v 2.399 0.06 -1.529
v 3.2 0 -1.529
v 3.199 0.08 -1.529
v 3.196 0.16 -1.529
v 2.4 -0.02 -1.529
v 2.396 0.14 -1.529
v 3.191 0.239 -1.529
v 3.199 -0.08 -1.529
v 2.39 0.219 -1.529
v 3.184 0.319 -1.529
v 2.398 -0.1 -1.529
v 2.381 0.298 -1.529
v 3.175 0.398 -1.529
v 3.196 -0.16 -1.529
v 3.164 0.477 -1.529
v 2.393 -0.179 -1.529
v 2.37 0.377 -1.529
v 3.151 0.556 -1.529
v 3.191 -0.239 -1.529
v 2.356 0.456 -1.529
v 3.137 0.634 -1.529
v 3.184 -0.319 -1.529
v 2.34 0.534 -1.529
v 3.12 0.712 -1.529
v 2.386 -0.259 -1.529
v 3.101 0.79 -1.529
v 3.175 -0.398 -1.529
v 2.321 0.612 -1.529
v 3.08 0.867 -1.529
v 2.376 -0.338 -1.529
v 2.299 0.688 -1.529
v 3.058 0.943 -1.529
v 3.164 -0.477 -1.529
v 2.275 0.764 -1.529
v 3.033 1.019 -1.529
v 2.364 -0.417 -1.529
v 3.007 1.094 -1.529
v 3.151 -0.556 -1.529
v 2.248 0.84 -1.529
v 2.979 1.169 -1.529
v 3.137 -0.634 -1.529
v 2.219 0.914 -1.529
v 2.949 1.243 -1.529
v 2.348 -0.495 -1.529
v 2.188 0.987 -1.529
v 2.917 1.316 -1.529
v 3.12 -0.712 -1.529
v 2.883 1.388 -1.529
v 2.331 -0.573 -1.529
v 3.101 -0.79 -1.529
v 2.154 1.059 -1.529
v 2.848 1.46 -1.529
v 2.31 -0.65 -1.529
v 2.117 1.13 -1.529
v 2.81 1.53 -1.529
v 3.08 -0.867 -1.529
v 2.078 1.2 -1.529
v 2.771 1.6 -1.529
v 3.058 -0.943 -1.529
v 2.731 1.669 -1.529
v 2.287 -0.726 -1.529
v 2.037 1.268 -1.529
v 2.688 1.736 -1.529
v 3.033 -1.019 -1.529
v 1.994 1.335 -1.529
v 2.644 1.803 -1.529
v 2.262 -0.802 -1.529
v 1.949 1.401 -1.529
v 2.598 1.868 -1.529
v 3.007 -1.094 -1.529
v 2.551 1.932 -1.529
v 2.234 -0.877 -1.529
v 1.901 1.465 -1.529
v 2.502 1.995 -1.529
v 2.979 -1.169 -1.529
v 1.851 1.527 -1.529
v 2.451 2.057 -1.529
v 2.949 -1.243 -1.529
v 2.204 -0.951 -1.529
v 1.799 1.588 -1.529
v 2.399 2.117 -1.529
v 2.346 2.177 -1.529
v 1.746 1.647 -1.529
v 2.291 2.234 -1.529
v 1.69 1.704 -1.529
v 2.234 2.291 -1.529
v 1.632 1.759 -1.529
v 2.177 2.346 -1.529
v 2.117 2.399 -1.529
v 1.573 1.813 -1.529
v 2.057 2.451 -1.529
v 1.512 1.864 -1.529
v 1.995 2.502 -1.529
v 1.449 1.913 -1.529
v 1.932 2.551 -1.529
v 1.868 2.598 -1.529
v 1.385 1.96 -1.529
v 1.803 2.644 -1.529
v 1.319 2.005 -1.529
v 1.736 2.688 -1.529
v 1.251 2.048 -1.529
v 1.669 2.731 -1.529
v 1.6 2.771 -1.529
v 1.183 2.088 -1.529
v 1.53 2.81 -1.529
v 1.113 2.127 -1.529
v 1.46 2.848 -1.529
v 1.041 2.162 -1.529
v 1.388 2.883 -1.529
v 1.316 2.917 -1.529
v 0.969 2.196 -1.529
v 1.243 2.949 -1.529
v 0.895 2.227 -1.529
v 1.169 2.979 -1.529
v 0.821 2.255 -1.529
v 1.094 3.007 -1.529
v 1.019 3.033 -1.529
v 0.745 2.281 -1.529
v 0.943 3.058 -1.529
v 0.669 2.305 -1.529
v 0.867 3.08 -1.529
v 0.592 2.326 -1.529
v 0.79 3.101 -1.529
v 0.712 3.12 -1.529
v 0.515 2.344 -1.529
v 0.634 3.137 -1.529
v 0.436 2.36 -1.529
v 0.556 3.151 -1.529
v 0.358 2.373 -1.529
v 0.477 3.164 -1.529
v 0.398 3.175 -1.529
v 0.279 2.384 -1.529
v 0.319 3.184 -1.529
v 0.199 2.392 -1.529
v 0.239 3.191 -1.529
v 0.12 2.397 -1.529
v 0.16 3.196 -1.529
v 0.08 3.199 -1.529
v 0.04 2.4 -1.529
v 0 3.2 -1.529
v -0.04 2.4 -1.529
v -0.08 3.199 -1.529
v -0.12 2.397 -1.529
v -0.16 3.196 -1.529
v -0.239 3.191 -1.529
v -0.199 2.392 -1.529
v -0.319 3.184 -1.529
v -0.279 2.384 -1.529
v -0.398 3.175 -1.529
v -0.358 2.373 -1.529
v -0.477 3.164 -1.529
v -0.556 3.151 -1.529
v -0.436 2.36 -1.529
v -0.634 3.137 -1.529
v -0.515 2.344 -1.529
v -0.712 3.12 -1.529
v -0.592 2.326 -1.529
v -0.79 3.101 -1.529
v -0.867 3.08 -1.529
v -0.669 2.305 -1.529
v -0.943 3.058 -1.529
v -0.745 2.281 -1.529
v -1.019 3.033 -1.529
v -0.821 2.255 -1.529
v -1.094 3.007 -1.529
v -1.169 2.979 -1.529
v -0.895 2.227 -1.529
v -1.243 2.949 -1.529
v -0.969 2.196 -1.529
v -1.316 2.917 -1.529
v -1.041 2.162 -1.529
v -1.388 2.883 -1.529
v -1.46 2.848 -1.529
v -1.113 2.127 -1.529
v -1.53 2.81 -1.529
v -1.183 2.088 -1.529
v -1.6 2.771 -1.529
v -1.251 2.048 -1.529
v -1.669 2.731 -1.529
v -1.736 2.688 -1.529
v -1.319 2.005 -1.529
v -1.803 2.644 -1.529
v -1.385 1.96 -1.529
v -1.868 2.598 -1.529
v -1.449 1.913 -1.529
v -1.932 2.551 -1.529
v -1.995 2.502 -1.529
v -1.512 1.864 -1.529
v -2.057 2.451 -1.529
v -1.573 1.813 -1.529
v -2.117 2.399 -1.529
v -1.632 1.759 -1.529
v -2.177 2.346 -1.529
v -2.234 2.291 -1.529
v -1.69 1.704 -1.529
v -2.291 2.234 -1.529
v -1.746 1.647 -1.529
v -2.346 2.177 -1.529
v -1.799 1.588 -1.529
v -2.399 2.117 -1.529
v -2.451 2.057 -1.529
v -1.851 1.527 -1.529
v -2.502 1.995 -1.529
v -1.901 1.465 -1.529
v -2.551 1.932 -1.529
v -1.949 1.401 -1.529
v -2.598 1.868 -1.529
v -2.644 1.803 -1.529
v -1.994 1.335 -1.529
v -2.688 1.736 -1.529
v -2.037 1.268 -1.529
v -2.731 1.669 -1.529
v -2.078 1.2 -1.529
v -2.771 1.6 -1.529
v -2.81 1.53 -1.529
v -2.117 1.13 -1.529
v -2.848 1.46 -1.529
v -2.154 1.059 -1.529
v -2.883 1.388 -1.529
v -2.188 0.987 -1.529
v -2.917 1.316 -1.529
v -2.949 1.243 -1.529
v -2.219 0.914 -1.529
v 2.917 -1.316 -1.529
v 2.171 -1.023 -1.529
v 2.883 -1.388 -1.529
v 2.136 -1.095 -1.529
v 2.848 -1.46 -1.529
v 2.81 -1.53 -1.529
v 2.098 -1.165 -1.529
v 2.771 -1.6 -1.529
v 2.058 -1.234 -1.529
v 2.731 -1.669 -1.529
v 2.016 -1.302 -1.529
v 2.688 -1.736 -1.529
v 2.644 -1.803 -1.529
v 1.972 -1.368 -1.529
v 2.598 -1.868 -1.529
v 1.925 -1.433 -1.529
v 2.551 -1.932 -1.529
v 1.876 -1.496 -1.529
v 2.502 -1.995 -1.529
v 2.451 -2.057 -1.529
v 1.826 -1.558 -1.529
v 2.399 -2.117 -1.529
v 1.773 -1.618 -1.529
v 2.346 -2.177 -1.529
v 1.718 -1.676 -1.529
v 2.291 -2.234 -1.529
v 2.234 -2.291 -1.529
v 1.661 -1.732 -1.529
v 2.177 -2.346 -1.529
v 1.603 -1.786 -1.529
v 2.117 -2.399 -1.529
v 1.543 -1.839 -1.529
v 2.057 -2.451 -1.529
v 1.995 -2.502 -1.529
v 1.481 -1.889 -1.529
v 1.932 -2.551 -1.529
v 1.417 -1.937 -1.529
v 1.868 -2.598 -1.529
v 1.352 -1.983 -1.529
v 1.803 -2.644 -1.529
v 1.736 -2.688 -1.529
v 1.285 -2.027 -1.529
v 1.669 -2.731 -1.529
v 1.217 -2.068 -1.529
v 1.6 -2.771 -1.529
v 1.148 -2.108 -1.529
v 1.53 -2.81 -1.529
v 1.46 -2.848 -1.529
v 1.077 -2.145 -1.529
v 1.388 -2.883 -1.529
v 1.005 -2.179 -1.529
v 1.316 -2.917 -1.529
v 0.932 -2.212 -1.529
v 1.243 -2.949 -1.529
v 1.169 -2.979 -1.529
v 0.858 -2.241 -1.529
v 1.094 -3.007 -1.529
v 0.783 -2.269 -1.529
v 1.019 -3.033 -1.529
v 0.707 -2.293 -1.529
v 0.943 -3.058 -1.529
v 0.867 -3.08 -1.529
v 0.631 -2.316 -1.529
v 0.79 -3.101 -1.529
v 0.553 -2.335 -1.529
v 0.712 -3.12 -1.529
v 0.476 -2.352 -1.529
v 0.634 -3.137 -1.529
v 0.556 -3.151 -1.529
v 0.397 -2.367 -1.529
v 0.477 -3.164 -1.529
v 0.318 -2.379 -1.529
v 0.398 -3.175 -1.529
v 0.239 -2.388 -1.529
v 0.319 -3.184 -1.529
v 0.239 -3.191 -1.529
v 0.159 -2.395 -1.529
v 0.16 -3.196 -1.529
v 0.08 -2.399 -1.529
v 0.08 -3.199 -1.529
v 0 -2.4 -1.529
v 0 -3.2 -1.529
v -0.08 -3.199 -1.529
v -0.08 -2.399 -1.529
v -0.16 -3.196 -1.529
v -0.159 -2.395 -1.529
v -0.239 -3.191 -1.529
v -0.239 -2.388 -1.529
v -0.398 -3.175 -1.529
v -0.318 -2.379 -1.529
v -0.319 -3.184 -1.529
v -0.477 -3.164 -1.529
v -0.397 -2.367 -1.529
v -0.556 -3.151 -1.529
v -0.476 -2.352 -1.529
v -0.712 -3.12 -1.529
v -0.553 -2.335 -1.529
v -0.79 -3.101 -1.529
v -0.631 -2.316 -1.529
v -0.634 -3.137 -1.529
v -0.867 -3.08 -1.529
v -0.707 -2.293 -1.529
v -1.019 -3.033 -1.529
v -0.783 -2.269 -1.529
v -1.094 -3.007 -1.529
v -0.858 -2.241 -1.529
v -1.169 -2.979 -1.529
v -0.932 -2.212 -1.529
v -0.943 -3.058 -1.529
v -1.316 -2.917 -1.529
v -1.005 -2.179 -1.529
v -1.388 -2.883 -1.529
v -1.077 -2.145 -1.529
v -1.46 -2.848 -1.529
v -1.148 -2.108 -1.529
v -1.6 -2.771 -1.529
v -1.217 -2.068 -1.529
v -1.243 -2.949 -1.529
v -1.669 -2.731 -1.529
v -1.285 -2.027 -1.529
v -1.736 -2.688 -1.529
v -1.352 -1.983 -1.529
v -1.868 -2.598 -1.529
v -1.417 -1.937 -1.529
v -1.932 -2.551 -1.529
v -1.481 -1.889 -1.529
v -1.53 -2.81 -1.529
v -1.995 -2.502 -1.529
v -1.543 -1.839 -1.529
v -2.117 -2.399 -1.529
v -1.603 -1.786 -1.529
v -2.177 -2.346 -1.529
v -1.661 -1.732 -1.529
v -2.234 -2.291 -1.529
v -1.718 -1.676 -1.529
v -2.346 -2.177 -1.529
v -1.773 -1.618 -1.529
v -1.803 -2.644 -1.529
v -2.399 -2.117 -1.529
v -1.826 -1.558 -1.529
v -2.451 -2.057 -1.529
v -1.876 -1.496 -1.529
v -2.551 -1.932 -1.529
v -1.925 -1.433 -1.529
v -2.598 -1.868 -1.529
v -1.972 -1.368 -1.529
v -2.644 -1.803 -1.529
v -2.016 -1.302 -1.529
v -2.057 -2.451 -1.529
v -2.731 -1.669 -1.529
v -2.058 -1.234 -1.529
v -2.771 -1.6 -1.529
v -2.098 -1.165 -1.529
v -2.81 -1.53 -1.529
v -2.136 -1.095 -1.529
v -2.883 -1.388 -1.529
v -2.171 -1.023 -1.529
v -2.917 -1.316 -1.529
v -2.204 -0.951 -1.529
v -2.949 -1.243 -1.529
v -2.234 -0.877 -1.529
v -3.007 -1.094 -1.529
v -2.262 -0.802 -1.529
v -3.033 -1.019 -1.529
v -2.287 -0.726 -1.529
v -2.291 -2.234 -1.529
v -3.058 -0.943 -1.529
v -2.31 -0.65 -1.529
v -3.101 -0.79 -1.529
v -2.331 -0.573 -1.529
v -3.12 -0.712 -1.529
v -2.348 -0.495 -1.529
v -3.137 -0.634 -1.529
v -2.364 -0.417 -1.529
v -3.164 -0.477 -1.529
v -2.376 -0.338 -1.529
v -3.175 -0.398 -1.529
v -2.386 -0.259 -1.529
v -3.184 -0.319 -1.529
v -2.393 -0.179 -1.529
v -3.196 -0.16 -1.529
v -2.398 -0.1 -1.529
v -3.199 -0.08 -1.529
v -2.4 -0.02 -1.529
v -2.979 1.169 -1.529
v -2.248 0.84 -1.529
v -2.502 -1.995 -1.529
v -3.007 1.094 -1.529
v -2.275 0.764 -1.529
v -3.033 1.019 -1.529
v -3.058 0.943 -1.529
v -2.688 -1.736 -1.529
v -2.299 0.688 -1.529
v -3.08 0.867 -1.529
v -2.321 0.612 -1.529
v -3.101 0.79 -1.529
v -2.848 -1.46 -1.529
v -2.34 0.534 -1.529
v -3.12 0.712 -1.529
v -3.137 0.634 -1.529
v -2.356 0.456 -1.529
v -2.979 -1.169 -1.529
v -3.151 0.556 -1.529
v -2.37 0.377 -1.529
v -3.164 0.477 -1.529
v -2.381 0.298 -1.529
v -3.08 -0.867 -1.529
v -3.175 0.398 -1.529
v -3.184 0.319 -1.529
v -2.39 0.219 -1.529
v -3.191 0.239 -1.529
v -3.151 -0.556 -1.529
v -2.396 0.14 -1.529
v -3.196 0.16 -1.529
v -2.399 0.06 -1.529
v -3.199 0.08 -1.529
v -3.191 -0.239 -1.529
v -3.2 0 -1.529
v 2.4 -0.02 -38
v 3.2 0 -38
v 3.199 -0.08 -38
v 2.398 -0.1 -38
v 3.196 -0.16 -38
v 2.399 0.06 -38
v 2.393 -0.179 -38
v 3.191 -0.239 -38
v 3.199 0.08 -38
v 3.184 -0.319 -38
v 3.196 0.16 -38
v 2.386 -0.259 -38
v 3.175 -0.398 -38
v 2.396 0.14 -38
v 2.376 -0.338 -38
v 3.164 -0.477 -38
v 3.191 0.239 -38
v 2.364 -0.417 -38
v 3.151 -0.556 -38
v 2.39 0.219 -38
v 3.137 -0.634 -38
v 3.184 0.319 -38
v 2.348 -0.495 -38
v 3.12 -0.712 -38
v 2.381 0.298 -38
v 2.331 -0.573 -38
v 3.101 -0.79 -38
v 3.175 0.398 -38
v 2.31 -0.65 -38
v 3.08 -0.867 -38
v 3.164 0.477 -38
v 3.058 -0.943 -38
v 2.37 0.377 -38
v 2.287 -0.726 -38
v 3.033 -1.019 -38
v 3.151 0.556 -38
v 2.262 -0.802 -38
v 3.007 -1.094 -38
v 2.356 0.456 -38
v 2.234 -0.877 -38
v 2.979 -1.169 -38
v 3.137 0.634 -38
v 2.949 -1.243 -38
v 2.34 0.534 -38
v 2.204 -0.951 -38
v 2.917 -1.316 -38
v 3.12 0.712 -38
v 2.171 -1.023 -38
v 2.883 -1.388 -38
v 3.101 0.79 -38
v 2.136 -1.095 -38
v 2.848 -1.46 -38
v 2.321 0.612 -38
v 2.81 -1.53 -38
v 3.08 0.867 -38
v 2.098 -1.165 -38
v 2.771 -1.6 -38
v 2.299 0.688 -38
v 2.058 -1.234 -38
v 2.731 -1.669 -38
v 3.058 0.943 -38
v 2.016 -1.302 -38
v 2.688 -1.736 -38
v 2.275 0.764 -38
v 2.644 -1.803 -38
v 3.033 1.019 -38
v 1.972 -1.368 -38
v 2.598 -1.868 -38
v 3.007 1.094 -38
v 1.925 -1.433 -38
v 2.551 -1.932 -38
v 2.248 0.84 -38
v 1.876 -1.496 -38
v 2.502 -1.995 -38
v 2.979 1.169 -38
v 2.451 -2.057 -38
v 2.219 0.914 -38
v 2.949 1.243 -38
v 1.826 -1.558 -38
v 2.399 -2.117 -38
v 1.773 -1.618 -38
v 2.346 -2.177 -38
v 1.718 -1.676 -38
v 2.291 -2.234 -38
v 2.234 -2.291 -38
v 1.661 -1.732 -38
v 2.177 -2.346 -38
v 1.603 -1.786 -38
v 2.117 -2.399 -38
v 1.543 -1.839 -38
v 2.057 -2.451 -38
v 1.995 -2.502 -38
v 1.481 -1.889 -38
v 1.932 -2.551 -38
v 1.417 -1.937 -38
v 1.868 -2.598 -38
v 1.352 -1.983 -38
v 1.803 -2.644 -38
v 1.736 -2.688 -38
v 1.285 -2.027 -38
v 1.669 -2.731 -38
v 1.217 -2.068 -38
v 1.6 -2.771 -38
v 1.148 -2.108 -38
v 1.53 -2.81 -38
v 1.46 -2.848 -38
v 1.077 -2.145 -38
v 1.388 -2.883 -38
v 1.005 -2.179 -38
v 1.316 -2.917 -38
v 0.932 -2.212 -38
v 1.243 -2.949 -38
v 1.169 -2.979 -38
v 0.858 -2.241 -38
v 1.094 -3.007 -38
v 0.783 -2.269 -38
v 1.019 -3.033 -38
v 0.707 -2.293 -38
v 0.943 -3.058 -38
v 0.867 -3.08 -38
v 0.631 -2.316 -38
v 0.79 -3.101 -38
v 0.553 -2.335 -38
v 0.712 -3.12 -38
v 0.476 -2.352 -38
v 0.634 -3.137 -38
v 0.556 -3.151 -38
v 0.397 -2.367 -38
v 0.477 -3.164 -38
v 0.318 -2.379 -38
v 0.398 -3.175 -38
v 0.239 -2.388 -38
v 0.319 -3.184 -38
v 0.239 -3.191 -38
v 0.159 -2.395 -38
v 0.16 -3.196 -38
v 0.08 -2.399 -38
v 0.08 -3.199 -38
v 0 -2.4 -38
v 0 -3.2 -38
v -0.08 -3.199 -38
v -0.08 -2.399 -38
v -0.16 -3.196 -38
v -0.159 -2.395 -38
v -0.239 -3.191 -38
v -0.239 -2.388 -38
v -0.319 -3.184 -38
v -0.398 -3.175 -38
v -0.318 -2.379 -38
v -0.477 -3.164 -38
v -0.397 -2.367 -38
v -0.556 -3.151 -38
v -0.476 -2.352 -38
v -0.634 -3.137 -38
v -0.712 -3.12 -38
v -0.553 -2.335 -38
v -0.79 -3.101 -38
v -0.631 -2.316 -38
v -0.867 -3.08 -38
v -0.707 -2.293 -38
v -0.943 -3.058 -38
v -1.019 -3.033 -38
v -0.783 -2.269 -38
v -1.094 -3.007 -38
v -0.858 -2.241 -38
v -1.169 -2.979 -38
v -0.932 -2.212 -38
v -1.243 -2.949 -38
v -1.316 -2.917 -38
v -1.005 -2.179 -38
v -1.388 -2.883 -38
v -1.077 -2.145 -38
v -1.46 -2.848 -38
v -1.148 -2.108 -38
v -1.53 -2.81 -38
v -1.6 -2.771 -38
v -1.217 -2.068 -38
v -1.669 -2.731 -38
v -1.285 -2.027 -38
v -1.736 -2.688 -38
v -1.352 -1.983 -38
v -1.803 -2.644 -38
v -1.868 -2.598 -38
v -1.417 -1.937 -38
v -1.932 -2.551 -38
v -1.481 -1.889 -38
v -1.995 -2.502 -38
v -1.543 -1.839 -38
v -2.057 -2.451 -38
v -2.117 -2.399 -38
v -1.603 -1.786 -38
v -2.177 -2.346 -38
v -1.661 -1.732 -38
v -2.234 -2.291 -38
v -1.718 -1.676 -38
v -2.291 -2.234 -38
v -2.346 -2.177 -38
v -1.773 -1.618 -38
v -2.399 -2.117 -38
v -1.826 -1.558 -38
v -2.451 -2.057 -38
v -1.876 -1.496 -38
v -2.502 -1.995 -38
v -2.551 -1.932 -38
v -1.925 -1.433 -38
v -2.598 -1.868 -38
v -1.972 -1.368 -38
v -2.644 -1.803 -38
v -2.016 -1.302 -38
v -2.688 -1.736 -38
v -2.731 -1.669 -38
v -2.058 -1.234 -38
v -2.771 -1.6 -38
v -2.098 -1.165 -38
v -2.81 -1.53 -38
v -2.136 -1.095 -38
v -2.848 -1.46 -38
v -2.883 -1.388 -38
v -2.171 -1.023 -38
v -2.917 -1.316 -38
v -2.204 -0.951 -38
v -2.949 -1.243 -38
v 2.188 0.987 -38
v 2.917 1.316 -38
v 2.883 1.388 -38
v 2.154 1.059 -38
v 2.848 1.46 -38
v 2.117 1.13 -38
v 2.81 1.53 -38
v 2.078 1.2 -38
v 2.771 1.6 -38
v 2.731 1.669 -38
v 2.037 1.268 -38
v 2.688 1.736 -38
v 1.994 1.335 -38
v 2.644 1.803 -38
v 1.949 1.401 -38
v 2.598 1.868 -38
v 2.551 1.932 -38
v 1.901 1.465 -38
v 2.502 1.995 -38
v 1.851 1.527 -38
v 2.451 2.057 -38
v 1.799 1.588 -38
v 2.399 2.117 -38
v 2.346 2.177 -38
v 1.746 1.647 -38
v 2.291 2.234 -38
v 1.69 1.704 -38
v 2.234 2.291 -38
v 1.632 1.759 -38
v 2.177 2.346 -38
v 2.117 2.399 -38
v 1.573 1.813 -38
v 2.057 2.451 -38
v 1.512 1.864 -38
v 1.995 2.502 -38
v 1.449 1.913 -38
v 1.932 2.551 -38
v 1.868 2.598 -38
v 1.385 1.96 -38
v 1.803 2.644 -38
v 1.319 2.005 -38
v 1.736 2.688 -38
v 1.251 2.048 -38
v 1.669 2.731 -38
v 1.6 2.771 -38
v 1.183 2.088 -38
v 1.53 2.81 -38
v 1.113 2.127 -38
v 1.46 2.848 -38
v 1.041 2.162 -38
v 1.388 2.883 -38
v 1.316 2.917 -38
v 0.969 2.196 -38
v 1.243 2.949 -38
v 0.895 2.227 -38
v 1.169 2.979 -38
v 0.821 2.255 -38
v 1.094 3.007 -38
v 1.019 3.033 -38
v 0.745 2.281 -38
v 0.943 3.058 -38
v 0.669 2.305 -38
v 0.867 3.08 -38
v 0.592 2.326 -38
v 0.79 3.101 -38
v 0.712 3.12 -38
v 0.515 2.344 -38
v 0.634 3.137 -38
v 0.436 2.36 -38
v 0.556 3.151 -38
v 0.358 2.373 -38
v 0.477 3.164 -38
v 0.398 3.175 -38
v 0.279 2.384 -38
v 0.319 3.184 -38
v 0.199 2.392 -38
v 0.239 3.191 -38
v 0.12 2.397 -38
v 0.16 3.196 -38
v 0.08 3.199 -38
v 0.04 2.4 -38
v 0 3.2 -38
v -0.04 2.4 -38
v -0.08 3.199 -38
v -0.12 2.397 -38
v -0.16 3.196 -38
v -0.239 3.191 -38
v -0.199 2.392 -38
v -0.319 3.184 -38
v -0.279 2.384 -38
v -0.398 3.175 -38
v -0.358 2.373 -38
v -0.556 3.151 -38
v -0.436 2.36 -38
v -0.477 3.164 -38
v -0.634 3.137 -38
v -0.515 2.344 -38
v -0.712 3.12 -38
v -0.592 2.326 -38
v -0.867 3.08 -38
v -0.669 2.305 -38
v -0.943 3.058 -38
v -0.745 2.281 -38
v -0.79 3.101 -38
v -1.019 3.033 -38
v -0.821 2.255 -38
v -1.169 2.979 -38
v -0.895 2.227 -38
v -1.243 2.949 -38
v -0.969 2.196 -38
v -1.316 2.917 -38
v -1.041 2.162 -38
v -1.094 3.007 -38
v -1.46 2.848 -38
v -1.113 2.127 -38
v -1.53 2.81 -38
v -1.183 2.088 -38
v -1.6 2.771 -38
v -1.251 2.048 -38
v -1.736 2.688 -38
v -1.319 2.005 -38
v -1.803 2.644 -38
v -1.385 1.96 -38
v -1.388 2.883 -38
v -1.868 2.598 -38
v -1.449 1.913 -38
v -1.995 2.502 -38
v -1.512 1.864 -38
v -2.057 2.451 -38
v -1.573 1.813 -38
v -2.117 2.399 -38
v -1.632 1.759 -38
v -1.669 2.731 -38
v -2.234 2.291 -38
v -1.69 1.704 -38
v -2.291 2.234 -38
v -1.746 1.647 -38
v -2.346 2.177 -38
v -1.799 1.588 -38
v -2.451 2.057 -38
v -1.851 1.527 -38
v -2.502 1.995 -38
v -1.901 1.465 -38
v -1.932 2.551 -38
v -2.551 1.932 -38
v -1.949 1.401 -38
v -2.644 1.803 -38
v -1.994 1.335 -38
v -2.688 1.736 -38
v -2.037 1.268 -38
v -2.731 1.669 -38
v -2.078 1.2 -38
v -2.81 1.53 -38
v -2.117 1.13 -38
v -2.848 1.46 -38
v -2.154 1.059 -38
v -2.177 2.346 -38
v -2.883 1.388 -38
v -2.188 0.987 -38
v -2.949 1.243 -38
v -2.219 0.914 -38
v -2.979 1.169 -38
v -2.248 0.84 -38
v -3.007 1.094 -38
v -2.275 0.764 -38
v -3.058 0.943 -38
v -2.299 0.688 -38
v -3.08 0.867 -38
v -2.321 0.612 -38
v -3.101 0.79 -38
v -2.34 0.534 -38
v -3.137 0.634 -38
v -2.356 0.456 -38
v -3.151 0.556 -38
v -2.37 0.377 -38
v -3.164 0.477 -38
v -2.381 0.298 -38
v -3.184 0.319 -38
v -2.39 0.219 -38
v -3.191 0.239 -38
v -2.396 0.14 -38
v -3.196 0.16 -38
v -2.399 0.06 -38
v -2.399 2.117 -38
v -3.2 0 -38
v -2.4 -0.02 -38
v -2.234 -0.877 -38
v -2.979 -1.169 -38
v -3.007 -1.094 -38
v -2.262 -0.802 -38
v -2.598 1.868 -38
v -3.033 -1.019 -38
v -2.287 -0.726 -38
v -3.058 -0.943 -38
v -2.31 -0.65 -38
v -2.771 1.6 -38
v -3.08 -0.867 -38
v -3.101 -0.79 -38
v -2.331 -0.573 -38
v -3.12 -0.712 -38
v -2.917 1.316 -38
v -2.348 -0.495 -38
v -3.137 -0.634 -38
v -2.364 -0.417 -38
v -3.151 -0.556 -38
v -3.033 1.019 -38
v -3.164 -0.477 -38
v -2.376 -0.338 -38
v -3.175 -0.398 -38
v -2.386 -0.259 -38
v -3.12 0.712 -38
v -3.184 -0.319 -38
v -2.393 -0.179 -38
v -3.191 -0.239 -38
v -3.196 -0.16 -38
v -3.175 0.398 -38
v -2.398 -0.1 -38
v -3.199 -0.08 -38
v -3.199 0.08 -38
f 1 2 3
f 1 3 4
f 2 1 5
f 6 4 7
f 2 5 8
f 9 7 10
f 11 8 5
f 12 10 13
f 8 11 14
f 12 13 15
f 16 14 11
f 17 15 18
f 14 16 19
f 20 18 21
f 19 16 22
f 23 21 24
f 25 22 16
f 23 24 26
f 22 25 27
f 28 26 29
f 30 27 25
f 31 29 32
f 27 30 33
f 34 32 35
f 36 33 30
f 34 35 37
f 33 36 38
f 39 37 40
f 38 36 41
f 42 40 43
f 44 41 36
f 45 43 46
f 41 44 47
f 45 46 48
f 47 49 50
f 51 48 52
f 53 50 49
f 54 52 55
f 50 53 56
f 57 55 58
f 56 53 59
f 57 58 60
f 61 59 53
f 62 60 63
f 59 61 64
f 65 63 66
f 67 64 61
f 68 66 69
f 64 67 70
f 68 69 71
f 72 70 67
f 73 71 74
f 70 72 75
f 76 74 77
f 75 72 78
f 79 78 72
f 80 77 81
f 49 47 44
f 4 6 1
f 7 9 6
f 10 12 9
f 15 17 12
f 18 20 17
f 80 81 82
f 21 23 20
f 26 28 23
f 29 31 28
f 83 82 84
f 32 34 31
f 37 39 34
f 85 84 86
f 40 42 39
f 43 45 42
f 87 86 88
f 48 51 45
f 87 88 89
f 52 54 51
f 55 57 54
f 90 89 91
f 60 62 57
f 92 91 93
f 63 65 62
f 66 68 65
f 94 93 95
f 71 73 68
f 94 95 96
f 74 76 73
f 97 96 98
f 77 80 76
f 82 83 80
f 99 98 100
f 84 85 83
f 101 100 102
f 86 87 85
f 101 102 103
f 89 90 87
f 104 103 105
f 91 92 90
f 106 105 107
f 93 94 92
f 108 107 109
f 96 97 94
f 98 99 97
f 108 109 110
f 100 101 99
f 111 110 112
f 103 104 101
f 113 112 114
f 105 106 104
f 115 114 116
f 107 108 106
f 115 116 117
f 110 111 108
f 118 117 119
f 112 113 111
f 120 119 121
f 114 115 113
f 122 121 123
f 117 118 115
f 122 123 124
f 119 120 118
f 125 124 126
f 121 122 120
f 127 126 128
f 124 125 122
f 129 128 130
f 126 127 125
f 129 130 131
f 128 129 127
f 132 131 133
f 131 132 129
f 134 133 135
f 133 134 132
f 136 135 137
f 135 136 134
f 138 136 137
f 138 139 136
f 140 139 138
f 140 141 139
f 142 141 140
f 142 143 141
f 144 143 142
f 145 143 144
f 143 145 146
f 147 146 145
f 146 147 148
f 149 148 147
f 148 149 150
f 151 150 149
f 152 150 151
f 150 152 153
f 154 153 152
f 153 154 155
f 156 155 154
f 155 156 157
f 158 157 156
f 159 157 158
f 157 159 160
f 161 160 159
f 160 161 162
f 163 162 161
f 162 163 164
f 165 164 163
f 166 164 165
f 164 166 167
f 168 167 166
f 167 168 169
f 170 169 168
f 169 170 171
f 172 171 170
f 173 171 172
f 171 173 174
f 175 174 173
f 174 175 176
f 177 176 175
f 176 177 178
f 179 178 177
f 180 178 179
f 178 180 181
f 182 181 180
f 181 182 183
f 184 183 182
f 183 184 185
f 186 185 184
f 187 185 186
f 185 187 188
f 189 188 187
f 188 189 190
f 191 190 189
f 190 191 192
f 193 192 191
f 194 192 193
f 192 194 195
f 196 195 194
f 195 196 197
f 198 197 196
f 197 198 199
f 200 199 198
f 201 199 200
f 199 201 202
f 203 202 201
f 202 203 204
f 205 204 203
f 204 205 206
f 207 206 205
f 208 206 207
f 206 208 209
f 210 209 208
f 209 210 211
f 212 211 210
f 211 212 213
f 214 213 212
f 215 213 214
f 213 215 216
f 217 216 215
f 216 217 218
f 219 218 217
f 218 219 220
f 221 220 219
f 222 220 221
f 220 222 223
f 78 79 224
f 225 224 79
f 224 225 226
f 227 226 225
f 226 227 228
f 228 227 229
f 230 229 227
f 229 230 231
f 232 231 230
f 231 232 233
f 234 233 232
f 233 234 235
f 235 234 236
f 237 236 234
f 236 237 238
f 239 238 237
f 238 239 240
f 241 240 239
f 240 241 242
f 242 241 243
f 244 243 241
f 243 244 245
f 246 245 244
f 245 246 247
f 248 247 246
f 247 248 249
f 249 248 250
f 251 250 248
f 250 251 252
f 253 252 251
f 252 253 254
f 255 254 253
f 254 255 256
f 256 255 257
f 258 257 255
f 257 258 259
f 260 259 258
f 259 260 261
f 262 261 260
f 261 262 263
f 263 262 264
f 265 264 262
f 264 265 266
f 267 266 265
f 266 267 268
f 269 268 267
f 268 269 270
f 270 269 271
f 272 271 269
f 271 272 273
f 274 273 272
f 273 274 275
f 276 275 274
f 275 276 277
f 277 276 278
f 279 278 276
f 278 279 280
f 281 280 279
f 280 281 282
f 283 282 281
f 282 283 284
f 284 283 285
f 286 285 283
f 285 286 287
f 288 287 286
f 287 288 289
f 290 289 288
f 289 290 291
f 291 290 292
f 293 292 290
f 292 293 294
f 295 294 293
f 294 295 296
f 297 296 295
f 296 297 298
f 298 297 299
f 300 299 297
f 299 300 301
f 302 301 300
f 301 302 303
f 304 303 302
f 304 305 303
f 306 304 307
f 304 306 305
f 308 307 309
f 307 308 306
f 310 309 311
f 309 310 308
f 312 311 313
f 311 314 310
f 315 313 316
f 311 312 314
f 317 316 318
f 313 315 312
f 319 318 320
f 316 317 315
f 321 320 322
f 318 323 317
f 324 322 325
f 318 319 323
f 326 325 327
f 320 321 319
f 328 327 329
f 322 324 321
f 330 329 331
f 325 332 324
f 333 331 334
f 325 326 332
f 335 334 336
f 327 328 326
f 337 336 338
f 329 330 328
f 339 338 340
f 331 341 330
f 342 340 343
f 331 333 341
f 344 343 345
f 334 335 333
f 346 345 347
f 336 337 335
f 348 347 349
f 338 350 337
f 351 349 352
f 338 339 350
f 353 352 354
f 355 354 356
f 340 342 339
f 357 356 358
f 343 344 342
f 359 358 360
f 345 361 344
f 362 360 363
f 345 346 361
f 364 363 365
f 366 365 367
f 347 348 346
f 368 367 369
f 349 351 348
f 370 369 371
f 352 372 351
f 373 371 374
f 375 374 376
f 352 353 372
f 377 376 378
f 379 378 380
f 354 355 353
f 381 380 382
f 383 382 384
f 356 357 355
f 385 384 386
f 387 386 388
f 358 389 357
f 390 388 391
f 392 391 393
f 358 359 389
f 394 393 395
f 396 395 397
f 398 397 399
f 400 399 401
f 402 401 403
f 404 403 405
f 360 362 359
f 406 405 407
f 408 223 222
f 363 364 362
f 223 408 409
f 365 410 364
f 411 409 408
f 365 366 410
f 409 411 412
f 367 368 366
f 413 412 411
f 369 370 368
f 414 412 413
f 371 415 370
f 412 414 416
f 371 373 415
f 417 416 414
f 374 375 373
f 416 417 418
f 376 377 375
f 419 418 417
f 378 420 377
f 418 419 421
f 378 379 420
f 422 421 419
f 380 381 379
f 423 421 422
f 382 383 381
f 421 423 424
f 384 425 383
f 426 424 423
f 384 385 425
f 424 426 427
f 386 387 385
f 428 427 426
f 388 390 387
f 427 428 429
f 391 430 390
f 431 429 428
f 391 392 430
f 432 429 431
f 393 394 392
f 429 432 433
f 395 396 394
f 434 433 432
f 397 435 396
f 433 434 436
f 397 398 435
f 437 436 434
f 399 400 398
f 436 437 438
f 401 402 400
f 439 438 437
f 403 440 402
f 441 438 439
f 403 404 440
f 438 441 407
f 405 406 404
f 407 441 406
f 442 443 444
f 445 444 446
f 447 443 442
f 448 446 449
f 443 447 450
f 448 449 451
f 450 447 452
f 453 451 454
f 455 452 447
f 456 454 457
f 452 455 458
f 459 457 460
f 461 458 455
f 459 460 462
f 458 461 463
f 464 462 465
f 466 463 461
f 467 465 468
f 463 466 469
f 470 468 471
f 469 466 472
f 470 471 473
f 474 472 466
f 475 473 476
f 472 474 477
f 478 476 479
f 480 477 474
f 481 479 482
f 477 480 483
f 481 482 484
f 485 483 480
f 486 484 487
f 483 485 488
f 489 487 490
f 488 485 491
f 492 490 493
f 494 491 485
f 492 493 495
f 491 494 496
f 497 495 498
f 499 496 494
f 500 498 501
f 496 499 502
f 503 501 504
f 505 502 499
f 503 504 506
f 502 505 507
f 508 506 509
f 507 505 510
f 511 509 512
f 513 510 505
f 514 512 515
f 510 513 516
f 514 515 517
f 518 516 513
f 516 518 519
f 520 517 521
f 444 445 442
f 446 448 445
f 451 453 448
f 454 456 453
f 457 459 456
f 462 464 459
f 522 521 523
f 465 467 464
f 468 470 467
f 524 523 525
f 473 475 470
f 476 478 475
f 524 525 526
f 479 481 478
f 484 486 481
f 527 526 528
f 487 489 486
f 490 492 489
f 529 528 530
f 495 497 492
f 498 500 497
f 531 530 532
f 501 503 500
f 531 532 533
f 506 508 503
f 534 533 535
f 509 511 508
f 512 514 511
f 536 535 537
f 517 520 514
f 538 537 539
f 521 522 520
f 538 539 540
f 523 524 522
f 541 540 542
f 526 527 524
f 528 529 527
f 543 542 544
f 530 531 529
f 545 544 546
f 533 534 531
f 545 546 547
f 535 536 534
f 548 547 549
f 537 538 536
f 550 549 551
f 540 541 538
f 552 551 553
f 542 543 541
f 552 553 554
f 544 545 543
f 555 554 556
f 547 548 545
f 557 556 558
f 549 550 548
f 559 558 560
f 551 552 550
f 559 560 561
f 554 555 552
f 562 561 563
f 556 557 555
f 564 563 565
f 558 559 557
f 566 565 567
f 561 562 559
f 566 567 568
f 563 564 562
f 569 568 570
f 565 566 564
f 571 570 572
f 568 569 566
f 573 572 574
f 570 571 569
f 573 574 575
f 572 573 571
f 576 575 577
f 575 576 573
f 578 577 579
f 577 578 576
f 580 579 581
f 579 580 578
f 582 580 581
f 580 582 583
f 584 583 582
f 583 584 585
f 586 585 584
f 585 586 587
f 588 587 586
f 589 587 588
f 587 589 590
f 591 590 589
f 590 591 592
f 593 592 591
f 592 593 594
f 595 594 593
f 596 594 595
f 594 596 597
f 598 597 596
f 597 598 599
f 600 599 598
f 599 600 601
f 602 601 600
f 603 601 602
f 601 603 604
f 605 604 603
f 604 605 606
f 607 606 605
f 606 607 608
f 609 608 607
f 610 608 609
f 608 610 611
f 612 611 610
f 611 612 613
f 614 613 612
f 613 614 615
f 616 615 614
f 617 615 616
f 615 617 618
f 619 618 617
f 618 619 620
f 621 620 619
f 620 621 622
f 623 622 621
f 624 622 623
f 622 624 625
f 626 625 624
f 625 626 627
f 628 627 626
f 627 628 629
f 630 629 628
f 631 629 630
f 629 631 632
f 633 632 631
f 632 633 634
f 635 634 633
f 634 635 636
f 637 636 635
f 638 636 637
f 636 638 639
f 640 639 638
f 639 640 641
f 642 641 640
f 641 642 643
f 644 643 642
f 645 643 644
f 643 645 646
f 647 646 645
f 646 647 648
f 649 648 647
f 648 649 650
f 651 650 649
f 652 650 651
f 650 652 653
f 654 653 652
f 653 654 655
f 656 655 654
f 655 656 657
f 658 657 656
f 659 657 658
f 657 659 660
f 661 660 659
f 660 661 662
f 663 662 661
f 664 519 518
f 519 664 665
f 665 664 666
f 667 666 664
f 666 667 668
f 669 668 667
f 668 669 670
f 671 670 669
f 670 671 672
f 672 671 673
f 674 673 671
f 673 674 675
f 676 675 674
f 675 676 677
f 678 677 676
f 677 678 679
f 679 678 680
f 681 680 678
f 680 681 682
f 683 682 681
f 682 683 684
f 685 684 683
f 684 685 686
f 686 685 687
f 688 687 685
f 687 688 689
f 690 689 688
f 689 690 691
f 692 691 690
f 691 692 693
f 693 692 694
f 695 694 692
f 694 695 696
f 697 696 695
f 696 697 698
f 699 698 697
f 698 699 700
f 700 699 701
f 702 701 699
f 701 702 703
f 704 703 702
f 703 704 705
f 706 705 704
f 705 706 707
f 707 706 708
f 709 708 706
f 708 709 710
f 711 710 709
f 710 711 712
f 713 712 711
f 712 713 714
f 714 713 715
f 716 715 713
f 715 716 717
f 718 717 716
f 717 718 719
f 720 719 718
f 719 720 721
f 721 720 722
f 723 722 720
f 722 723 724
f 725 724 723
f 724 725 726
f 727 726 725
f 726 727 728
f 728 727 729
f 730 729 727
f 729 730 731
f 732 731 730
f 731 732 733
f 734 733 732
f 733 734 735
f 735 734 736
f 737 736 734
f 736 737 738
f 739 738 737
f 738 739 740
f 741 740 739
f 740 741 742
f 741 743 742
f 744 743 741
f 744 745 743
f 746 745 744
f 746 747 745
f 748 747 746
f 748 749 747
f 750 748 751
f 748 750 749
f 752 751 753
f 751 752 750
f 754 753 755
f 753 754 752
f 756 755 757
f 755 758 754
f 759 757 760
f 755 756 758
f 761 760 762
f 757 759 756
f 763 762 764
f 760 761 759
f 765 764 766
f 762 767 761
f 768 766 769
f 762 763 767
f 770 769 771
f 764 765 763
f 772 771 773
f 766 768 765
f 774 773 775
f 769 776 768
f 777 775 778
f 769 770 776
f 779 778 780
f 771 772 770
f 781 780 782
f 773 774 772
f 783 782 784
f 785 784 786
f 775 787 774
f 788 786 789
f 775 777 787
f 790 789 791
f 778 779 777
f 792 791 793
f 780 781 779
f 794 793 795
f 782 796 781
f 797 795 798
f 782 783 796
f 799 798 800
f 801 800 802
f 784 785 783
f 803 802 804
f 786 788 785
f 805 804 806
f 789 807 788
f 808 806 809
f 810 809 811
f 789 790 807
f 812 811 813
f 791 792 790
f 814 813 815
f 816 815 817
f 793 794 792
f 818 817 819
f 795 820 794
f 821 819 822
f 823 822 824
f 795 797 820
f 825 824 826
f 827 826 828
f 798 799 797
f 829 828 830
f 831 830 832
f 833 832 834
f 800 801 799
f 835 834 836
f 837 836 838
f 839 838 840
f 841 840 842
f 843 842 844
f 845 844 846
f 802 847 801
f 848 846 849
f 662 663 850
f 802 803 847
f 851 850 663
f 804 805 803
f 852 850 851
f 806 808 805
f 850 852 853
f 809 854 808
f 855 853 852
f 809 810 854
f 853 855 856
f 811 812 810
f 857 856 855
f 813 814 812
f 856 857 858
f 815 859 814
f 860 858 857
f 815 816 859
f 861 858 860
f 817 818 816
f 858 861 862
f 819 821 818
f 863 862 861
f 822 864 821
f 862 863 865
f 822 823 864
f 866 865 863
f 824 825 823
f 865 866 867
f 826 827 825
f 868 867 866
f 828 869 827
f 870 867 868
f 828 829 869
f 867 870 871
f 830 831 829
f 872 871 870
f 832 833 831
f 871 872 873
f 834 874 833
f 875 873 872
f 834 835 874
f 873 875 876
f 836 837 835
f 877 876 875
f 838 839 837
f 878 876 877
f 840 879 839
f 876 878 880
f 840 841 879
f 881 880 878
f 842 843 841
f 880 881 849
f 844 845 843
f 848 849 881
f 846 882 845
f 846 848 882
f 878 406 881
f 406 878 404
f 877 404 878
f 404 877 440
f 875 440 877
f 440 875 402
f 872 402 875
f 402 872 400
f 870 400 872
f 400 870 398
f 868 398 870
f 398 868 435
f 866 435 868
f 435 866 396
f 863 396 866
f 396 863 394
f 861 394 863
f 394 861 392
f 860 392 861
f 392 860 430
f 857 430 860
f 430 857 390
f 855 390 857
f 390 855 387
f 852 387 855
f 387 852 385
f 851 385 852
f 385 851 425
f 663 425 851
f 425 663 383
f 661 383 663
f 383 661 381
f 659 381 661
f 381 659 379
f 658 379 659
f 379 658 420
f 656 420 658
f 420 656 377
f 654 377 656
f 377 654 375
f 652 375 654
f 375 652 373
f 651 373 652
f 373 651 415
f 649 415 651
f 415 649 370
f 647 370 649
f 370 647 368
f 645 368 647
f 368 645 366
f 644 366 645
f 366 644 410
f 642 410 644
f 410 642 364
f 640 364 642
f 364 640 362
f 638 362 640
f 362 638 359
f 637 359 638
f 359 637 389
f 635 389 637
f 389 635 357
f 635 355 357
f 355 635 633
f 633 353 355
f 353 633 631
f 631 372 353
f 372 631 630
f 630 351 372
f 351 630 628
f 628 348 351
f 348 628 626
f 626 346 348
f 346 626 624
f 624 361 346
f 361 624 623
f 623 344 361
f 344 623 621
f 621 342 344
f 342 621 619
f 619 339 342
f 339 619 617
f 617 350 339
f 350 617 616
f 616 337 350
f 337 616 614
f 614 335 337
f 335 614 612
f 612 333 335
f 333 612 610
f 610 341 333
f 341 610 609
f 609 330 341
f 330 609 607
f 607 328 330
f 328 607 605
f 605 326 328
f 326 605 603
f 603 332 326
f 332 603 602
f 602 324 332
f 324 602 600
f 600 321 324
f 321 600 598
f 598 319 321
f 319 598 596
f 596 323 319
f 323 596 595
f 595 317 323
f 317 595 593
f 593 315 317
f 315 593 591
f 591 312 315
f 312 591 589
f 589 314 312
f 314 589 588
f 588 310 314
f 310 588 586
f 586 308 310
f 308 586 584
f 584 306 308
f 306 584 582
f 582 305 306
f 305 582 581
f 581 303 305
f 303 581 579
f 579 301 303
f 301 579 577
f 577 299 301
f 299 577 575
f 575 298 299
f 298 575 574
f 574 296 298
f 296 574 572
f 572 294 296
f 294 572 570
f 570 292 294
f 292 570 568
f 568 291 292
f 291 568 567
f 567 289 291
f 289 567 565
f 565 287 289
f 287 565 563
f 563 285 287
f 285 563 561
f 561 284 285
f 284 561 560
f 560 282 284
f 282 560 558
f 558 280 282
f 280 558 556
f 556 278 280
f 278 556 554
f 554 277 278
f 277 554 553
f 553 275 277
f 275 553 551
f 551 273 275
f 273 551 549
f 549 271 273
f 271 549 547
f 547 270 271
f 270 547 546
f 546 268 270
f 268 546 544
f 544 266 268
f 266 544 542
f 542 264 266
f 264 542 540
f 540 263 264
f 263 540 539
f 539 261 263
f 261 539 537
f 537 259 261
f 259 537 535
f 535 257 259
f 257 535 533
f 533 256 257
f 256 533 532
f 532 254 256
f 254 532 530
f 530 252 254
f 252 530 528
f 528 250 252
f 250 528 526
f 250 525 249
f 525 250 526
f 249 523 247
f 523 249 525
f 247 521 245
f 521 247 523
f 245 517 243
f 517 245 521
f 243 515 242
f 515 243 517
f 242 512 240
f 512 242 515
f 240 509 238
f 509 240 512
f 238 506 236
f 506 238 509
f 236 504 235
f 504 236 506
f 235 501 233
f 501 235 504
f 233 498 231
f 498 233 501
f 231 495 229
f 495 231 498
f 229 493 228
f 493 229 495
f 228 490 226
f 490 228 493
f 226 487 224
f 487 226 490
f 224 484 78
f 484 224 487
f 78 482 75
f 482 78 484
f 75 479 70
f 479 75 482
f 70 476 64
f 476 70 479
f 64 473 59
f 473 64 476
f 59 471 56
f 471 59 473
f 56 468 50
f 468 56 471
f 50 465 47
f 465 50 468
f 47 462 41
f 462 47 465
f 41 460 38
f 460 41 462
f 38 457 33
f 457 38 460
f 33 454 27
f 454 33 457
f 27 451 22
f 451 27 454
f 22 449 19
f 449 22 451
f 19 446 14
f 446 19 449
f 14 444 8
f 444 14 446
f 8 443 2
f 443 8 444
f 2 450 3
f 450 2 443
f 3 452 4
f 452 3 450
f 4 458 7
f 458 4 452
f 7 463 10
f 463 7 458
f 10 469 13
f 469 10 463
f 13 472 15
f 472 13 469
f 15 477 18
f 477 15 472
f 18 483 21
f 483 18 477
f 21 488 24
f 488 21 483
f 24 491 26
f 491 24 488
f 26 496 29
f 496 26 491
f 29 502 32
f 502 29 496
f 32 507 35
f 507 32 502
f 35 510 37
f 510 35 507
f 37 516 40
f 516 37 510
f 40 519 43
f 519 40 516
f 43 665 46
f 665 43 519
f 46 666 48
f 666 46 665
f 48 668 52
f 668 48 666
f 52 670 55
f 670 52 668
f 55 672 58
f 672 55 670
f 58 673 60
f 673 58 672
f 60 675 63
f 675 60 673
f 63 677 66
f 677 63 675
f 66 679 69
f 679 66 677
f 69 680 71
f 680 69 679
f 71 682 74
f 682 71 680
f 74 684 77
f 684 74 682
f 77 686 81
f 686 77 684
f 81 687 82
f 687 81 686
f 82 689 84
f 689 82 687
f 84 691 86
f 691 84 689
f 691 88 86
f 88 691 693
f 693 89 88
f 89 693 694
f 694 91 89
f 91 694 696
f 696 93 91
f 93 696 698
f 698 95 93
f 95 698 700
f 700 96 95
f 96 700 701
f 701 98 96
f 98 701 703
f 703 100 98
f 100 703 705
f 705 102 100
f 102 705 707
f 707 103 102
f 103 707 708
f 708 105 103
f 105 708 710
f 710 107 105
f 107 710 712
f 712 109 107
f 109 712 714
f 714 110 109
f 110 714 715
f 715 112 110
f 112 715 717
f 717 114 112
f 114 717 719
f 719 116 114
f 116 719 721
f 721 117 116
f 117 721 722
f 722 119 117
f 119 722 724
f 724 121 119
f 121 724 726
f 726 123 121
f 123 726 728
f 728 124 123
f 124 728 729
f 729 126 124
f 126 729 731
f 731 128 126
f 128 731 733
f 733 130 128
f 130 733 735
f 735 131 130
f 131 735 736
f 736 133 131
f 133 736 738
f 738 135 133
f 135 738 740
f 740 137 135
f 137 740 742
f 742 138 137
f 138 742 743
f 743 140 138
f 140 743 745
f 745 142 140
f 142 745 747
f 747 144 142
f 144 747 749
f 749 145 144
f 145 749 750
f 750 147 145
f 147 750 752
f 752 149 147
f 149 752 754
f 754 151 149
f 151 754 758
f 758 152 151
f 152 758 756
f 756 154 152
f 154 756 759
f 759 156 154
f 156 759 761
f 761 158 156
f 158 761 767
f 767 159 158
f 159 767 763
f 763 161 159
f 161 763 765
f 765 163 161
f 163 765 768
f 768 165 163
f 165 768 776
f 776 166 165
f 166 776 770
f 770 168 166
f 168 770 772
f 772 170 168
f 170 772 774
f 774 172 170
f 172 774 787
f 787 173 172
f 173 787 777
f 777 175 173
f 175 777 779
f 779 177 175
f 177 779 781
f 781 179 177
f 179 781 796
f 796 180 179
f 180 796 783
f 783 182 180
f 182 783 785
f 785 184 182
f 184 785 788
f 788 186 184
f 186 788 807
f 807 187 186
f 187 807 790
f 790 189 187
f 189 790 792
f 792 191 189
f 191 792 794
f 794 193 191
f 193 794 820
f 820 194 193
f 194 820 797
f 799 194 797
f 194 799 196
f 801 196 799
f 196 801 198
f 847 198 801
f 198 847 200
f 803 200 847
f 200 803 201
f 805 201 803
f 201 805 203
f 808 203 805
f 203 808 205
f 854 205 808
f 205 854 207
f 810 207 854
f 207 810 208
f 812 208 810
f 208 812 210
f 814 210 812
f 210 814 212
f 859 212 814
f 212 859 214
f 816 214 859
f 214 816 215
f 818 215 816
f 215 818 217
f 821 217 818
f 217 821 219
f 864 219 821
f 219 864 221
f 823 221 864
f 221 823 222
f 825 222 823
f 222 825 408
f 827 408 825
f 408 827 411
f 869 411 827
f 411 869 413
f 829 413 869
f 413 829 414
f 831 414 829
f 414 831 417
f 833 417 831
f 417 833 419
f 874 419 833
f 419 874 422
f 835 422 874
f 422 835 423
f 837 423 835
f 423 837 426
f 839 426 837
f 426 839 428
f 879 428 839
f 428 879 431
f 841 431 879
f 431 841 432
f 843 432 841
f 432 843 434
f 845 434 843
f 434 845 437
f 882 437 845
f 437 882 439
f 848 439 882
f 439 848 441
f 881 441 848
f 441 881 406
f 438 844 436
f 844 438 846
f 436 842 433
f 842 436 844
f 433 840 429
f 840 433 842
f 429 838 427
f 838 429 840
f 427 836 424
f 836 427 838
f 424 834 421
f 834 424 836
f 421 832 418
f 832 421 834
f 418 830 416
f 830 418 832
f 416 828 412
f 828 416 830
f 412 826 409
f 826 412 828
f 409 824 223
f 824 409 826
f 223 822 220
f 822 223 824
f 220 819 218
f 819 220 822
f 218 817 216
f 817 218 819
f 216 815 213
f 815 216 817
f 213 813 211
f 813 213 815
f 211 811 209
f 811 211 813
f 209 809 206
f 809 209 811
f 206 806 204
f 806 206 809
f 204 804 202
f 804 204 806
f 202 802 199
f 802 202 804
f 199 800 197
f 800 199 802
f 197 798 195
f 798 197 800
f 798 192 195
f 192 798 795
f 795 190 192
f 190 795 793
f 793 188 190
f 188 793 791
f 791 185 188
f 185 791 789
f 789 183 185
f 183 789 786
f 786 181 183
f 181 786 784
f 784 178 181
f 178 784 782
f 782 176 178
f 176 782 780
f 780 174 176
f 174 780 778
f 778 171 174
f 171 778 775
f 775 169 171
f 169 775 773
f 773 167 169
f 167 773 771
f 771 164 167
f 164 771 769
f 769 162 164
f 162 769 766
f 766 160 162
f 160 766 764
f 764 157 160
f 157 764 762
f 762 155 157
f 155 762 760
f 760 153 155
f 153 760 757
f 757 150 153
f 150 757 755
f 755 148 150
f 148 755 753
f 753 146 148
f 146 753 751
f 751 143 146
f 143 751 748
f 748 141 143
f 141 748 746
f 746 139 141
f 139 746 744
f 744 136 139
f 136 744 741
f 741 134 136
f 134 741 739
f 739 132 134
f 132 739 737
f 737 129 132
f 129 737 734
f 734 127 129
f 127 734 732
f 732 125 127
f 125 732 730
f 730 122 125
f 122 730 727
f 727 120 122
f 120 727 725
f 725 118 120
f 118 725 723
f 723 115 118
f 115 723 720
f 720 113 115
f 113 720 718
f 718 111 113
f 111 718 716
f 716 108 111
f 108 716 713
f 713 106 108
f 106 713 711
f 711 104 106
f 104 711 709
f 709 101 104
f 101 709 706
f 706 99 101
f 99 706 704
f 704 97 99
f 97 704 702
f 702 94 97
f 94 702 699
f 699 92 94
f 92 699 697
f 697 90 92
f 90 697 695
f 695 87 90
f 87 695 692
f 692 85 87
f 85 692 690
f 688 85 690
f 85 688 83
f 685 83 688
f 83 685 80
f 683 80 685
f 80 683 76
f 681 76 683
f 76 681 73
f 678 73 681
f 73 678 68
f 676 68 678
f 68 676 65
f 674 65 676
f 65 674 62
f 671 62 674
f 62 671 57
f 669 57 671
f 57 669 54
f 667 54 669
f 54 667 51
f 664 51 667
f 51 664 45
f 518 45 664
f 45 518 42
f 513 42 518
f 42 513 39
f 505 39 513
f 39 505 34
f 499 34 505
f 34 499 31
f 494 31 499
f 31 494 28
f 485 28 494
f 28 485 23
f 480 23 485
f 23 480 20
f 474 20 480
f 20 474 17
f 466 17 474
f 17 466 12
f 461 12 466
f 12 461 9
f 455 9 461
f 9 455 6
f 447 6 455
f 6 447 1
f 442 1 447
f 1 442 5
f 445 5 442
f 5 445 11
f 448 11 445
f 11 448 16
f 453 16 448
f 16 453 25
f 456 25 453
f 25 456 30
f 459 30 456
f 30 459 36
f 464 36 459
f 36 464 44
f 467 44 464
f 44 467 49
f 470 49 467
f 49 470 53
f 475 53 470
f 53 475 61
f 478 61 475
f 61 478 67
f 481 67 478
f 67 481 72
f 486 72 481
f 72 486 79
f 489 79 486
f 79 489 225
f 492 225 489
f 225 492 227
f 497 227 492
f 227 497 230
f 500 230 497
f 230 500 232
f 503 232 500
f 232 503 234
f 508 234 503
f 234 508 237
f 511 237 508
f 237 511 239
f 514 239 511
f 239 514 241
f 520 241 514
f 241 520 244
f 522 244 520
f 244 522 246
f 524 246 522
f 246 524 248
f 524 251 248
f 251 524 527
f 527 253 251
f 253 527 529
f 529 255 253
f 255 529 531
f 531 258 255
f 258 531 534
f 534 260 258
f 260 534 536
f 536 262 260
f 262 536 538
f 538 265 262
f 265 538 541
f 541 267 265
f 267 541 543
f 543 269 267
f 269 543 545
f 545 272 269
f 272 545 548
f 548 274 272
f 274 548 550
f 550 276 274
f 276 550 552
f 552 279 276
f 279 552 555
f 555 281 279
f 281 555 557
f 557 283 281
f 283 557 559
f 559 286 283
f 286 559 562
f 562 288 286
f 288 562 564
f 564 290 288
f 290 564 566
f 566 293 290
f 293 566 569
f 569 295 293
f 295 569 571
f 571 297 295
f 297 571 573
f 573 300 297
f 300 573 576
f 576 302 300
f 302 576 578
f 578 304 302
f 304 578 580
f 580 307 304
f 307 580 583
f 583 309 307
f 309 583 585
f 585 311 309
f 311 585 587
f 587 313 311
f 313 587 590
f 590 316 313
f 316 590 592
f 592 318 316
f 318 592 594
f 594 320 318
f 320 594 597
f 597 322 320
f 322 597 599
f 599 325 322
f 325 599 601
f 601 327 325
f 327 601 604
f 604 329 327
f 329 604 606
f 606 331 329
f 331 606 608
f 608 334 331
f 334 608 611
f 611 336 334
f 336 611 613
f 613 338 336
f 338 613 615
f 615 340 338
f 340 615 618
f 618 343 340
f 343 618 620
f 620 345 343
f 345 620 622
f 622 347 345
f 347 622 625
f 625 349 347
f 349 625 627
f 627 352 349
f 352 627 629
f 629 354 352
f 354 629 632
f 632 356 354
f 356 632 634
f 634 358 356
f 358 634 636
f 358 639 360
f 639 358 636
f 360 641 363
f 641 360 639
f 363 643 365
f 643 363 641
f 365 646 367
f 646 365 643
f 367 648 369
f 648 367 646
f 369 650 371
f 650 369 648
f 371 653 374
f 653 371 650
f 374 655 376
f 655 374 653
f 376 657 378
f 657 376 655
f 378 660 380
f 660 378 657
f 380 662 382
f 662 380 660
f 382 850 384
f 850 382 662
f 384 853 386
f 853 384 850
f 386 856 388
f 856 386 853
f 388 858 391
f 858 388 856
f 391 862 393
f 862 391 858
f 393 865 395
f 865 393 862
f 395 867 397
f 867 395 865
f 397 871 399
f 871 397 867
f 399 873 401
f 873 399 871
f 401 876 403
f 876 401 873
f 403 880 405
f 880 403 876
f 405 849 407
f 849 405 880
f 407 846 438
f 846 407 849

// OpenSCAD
use <../../lib.scad>
use <../../p/box4t.scad>
use <76371s02.scad>
use <../../p/stug7-1x2.scad>
$fa=1; $fs=0.2;
function ldraw_lib__s__76371s01(realsolid=false) = [
// 0 ~Duplo Brick  1 x  2 x  2 with Bottom Tube without Front
// 0 Name: s\76371s01.dat
// 0 Author: Philippe Hurbain [Philo]
// 0 !LDRAW_ORG Subpart UPDATE 2022-01
// 0 !LICENSE Licensed under CC BY 2.0 and CC BY 4.0 : see CAreadme.txt
// 
// 0 BFC CERTIFY CCW
  [0,"BFC","CERTIFY"],
  [0,"BFC","CCW"],
// 
// 0 !HISTORY 2020-12-12 {LEGO/Unity Microgame} Original part shape
// 0 !HISTORY 2021-01-09 [Philo] File preparation for LDraw Parts Tracker
// 0 !HISTORY 2022-01-14 [PTadmin] Official Update 2022-01
// 
// 
// 1 16 0 0 0 1 0 0 0 1 0 0 0 1 s\76371s02.dat
  [1,16,0,0,0,1,0,0,0,1,0,0,0,1, ldraw_lib__s__76371s02(realsolid)],
// 1 16 0 96 0 40 0 0 0 -96 0 0 0 20 box4t.dat
  [1,16,0,96,0,40,0,0,0,-96,0,0,0,20, ldraw_lib__box4t(realsolid)],
// 1 16 0 0 0 1 0 0 0 2.75 0 0 0 1 stug7-1x2.dat
  [1,16,0,0,0,1,0,0,0,2.75,0,0,0,1, ldraw_lib__stug7_1x2(realsolid)],
];
module ldraw_lib__s__76371s01(step=0, col=false, unit=2/5, alt=false, line=0.2, solid=!$preview)
    makepoly(ldraw_lib__s__76371s01(solid), step=step, col=col, unit=unit, alt=alt, line=line, solid=solid);
ldraw_lib__s__76371s01(line=0.2);
